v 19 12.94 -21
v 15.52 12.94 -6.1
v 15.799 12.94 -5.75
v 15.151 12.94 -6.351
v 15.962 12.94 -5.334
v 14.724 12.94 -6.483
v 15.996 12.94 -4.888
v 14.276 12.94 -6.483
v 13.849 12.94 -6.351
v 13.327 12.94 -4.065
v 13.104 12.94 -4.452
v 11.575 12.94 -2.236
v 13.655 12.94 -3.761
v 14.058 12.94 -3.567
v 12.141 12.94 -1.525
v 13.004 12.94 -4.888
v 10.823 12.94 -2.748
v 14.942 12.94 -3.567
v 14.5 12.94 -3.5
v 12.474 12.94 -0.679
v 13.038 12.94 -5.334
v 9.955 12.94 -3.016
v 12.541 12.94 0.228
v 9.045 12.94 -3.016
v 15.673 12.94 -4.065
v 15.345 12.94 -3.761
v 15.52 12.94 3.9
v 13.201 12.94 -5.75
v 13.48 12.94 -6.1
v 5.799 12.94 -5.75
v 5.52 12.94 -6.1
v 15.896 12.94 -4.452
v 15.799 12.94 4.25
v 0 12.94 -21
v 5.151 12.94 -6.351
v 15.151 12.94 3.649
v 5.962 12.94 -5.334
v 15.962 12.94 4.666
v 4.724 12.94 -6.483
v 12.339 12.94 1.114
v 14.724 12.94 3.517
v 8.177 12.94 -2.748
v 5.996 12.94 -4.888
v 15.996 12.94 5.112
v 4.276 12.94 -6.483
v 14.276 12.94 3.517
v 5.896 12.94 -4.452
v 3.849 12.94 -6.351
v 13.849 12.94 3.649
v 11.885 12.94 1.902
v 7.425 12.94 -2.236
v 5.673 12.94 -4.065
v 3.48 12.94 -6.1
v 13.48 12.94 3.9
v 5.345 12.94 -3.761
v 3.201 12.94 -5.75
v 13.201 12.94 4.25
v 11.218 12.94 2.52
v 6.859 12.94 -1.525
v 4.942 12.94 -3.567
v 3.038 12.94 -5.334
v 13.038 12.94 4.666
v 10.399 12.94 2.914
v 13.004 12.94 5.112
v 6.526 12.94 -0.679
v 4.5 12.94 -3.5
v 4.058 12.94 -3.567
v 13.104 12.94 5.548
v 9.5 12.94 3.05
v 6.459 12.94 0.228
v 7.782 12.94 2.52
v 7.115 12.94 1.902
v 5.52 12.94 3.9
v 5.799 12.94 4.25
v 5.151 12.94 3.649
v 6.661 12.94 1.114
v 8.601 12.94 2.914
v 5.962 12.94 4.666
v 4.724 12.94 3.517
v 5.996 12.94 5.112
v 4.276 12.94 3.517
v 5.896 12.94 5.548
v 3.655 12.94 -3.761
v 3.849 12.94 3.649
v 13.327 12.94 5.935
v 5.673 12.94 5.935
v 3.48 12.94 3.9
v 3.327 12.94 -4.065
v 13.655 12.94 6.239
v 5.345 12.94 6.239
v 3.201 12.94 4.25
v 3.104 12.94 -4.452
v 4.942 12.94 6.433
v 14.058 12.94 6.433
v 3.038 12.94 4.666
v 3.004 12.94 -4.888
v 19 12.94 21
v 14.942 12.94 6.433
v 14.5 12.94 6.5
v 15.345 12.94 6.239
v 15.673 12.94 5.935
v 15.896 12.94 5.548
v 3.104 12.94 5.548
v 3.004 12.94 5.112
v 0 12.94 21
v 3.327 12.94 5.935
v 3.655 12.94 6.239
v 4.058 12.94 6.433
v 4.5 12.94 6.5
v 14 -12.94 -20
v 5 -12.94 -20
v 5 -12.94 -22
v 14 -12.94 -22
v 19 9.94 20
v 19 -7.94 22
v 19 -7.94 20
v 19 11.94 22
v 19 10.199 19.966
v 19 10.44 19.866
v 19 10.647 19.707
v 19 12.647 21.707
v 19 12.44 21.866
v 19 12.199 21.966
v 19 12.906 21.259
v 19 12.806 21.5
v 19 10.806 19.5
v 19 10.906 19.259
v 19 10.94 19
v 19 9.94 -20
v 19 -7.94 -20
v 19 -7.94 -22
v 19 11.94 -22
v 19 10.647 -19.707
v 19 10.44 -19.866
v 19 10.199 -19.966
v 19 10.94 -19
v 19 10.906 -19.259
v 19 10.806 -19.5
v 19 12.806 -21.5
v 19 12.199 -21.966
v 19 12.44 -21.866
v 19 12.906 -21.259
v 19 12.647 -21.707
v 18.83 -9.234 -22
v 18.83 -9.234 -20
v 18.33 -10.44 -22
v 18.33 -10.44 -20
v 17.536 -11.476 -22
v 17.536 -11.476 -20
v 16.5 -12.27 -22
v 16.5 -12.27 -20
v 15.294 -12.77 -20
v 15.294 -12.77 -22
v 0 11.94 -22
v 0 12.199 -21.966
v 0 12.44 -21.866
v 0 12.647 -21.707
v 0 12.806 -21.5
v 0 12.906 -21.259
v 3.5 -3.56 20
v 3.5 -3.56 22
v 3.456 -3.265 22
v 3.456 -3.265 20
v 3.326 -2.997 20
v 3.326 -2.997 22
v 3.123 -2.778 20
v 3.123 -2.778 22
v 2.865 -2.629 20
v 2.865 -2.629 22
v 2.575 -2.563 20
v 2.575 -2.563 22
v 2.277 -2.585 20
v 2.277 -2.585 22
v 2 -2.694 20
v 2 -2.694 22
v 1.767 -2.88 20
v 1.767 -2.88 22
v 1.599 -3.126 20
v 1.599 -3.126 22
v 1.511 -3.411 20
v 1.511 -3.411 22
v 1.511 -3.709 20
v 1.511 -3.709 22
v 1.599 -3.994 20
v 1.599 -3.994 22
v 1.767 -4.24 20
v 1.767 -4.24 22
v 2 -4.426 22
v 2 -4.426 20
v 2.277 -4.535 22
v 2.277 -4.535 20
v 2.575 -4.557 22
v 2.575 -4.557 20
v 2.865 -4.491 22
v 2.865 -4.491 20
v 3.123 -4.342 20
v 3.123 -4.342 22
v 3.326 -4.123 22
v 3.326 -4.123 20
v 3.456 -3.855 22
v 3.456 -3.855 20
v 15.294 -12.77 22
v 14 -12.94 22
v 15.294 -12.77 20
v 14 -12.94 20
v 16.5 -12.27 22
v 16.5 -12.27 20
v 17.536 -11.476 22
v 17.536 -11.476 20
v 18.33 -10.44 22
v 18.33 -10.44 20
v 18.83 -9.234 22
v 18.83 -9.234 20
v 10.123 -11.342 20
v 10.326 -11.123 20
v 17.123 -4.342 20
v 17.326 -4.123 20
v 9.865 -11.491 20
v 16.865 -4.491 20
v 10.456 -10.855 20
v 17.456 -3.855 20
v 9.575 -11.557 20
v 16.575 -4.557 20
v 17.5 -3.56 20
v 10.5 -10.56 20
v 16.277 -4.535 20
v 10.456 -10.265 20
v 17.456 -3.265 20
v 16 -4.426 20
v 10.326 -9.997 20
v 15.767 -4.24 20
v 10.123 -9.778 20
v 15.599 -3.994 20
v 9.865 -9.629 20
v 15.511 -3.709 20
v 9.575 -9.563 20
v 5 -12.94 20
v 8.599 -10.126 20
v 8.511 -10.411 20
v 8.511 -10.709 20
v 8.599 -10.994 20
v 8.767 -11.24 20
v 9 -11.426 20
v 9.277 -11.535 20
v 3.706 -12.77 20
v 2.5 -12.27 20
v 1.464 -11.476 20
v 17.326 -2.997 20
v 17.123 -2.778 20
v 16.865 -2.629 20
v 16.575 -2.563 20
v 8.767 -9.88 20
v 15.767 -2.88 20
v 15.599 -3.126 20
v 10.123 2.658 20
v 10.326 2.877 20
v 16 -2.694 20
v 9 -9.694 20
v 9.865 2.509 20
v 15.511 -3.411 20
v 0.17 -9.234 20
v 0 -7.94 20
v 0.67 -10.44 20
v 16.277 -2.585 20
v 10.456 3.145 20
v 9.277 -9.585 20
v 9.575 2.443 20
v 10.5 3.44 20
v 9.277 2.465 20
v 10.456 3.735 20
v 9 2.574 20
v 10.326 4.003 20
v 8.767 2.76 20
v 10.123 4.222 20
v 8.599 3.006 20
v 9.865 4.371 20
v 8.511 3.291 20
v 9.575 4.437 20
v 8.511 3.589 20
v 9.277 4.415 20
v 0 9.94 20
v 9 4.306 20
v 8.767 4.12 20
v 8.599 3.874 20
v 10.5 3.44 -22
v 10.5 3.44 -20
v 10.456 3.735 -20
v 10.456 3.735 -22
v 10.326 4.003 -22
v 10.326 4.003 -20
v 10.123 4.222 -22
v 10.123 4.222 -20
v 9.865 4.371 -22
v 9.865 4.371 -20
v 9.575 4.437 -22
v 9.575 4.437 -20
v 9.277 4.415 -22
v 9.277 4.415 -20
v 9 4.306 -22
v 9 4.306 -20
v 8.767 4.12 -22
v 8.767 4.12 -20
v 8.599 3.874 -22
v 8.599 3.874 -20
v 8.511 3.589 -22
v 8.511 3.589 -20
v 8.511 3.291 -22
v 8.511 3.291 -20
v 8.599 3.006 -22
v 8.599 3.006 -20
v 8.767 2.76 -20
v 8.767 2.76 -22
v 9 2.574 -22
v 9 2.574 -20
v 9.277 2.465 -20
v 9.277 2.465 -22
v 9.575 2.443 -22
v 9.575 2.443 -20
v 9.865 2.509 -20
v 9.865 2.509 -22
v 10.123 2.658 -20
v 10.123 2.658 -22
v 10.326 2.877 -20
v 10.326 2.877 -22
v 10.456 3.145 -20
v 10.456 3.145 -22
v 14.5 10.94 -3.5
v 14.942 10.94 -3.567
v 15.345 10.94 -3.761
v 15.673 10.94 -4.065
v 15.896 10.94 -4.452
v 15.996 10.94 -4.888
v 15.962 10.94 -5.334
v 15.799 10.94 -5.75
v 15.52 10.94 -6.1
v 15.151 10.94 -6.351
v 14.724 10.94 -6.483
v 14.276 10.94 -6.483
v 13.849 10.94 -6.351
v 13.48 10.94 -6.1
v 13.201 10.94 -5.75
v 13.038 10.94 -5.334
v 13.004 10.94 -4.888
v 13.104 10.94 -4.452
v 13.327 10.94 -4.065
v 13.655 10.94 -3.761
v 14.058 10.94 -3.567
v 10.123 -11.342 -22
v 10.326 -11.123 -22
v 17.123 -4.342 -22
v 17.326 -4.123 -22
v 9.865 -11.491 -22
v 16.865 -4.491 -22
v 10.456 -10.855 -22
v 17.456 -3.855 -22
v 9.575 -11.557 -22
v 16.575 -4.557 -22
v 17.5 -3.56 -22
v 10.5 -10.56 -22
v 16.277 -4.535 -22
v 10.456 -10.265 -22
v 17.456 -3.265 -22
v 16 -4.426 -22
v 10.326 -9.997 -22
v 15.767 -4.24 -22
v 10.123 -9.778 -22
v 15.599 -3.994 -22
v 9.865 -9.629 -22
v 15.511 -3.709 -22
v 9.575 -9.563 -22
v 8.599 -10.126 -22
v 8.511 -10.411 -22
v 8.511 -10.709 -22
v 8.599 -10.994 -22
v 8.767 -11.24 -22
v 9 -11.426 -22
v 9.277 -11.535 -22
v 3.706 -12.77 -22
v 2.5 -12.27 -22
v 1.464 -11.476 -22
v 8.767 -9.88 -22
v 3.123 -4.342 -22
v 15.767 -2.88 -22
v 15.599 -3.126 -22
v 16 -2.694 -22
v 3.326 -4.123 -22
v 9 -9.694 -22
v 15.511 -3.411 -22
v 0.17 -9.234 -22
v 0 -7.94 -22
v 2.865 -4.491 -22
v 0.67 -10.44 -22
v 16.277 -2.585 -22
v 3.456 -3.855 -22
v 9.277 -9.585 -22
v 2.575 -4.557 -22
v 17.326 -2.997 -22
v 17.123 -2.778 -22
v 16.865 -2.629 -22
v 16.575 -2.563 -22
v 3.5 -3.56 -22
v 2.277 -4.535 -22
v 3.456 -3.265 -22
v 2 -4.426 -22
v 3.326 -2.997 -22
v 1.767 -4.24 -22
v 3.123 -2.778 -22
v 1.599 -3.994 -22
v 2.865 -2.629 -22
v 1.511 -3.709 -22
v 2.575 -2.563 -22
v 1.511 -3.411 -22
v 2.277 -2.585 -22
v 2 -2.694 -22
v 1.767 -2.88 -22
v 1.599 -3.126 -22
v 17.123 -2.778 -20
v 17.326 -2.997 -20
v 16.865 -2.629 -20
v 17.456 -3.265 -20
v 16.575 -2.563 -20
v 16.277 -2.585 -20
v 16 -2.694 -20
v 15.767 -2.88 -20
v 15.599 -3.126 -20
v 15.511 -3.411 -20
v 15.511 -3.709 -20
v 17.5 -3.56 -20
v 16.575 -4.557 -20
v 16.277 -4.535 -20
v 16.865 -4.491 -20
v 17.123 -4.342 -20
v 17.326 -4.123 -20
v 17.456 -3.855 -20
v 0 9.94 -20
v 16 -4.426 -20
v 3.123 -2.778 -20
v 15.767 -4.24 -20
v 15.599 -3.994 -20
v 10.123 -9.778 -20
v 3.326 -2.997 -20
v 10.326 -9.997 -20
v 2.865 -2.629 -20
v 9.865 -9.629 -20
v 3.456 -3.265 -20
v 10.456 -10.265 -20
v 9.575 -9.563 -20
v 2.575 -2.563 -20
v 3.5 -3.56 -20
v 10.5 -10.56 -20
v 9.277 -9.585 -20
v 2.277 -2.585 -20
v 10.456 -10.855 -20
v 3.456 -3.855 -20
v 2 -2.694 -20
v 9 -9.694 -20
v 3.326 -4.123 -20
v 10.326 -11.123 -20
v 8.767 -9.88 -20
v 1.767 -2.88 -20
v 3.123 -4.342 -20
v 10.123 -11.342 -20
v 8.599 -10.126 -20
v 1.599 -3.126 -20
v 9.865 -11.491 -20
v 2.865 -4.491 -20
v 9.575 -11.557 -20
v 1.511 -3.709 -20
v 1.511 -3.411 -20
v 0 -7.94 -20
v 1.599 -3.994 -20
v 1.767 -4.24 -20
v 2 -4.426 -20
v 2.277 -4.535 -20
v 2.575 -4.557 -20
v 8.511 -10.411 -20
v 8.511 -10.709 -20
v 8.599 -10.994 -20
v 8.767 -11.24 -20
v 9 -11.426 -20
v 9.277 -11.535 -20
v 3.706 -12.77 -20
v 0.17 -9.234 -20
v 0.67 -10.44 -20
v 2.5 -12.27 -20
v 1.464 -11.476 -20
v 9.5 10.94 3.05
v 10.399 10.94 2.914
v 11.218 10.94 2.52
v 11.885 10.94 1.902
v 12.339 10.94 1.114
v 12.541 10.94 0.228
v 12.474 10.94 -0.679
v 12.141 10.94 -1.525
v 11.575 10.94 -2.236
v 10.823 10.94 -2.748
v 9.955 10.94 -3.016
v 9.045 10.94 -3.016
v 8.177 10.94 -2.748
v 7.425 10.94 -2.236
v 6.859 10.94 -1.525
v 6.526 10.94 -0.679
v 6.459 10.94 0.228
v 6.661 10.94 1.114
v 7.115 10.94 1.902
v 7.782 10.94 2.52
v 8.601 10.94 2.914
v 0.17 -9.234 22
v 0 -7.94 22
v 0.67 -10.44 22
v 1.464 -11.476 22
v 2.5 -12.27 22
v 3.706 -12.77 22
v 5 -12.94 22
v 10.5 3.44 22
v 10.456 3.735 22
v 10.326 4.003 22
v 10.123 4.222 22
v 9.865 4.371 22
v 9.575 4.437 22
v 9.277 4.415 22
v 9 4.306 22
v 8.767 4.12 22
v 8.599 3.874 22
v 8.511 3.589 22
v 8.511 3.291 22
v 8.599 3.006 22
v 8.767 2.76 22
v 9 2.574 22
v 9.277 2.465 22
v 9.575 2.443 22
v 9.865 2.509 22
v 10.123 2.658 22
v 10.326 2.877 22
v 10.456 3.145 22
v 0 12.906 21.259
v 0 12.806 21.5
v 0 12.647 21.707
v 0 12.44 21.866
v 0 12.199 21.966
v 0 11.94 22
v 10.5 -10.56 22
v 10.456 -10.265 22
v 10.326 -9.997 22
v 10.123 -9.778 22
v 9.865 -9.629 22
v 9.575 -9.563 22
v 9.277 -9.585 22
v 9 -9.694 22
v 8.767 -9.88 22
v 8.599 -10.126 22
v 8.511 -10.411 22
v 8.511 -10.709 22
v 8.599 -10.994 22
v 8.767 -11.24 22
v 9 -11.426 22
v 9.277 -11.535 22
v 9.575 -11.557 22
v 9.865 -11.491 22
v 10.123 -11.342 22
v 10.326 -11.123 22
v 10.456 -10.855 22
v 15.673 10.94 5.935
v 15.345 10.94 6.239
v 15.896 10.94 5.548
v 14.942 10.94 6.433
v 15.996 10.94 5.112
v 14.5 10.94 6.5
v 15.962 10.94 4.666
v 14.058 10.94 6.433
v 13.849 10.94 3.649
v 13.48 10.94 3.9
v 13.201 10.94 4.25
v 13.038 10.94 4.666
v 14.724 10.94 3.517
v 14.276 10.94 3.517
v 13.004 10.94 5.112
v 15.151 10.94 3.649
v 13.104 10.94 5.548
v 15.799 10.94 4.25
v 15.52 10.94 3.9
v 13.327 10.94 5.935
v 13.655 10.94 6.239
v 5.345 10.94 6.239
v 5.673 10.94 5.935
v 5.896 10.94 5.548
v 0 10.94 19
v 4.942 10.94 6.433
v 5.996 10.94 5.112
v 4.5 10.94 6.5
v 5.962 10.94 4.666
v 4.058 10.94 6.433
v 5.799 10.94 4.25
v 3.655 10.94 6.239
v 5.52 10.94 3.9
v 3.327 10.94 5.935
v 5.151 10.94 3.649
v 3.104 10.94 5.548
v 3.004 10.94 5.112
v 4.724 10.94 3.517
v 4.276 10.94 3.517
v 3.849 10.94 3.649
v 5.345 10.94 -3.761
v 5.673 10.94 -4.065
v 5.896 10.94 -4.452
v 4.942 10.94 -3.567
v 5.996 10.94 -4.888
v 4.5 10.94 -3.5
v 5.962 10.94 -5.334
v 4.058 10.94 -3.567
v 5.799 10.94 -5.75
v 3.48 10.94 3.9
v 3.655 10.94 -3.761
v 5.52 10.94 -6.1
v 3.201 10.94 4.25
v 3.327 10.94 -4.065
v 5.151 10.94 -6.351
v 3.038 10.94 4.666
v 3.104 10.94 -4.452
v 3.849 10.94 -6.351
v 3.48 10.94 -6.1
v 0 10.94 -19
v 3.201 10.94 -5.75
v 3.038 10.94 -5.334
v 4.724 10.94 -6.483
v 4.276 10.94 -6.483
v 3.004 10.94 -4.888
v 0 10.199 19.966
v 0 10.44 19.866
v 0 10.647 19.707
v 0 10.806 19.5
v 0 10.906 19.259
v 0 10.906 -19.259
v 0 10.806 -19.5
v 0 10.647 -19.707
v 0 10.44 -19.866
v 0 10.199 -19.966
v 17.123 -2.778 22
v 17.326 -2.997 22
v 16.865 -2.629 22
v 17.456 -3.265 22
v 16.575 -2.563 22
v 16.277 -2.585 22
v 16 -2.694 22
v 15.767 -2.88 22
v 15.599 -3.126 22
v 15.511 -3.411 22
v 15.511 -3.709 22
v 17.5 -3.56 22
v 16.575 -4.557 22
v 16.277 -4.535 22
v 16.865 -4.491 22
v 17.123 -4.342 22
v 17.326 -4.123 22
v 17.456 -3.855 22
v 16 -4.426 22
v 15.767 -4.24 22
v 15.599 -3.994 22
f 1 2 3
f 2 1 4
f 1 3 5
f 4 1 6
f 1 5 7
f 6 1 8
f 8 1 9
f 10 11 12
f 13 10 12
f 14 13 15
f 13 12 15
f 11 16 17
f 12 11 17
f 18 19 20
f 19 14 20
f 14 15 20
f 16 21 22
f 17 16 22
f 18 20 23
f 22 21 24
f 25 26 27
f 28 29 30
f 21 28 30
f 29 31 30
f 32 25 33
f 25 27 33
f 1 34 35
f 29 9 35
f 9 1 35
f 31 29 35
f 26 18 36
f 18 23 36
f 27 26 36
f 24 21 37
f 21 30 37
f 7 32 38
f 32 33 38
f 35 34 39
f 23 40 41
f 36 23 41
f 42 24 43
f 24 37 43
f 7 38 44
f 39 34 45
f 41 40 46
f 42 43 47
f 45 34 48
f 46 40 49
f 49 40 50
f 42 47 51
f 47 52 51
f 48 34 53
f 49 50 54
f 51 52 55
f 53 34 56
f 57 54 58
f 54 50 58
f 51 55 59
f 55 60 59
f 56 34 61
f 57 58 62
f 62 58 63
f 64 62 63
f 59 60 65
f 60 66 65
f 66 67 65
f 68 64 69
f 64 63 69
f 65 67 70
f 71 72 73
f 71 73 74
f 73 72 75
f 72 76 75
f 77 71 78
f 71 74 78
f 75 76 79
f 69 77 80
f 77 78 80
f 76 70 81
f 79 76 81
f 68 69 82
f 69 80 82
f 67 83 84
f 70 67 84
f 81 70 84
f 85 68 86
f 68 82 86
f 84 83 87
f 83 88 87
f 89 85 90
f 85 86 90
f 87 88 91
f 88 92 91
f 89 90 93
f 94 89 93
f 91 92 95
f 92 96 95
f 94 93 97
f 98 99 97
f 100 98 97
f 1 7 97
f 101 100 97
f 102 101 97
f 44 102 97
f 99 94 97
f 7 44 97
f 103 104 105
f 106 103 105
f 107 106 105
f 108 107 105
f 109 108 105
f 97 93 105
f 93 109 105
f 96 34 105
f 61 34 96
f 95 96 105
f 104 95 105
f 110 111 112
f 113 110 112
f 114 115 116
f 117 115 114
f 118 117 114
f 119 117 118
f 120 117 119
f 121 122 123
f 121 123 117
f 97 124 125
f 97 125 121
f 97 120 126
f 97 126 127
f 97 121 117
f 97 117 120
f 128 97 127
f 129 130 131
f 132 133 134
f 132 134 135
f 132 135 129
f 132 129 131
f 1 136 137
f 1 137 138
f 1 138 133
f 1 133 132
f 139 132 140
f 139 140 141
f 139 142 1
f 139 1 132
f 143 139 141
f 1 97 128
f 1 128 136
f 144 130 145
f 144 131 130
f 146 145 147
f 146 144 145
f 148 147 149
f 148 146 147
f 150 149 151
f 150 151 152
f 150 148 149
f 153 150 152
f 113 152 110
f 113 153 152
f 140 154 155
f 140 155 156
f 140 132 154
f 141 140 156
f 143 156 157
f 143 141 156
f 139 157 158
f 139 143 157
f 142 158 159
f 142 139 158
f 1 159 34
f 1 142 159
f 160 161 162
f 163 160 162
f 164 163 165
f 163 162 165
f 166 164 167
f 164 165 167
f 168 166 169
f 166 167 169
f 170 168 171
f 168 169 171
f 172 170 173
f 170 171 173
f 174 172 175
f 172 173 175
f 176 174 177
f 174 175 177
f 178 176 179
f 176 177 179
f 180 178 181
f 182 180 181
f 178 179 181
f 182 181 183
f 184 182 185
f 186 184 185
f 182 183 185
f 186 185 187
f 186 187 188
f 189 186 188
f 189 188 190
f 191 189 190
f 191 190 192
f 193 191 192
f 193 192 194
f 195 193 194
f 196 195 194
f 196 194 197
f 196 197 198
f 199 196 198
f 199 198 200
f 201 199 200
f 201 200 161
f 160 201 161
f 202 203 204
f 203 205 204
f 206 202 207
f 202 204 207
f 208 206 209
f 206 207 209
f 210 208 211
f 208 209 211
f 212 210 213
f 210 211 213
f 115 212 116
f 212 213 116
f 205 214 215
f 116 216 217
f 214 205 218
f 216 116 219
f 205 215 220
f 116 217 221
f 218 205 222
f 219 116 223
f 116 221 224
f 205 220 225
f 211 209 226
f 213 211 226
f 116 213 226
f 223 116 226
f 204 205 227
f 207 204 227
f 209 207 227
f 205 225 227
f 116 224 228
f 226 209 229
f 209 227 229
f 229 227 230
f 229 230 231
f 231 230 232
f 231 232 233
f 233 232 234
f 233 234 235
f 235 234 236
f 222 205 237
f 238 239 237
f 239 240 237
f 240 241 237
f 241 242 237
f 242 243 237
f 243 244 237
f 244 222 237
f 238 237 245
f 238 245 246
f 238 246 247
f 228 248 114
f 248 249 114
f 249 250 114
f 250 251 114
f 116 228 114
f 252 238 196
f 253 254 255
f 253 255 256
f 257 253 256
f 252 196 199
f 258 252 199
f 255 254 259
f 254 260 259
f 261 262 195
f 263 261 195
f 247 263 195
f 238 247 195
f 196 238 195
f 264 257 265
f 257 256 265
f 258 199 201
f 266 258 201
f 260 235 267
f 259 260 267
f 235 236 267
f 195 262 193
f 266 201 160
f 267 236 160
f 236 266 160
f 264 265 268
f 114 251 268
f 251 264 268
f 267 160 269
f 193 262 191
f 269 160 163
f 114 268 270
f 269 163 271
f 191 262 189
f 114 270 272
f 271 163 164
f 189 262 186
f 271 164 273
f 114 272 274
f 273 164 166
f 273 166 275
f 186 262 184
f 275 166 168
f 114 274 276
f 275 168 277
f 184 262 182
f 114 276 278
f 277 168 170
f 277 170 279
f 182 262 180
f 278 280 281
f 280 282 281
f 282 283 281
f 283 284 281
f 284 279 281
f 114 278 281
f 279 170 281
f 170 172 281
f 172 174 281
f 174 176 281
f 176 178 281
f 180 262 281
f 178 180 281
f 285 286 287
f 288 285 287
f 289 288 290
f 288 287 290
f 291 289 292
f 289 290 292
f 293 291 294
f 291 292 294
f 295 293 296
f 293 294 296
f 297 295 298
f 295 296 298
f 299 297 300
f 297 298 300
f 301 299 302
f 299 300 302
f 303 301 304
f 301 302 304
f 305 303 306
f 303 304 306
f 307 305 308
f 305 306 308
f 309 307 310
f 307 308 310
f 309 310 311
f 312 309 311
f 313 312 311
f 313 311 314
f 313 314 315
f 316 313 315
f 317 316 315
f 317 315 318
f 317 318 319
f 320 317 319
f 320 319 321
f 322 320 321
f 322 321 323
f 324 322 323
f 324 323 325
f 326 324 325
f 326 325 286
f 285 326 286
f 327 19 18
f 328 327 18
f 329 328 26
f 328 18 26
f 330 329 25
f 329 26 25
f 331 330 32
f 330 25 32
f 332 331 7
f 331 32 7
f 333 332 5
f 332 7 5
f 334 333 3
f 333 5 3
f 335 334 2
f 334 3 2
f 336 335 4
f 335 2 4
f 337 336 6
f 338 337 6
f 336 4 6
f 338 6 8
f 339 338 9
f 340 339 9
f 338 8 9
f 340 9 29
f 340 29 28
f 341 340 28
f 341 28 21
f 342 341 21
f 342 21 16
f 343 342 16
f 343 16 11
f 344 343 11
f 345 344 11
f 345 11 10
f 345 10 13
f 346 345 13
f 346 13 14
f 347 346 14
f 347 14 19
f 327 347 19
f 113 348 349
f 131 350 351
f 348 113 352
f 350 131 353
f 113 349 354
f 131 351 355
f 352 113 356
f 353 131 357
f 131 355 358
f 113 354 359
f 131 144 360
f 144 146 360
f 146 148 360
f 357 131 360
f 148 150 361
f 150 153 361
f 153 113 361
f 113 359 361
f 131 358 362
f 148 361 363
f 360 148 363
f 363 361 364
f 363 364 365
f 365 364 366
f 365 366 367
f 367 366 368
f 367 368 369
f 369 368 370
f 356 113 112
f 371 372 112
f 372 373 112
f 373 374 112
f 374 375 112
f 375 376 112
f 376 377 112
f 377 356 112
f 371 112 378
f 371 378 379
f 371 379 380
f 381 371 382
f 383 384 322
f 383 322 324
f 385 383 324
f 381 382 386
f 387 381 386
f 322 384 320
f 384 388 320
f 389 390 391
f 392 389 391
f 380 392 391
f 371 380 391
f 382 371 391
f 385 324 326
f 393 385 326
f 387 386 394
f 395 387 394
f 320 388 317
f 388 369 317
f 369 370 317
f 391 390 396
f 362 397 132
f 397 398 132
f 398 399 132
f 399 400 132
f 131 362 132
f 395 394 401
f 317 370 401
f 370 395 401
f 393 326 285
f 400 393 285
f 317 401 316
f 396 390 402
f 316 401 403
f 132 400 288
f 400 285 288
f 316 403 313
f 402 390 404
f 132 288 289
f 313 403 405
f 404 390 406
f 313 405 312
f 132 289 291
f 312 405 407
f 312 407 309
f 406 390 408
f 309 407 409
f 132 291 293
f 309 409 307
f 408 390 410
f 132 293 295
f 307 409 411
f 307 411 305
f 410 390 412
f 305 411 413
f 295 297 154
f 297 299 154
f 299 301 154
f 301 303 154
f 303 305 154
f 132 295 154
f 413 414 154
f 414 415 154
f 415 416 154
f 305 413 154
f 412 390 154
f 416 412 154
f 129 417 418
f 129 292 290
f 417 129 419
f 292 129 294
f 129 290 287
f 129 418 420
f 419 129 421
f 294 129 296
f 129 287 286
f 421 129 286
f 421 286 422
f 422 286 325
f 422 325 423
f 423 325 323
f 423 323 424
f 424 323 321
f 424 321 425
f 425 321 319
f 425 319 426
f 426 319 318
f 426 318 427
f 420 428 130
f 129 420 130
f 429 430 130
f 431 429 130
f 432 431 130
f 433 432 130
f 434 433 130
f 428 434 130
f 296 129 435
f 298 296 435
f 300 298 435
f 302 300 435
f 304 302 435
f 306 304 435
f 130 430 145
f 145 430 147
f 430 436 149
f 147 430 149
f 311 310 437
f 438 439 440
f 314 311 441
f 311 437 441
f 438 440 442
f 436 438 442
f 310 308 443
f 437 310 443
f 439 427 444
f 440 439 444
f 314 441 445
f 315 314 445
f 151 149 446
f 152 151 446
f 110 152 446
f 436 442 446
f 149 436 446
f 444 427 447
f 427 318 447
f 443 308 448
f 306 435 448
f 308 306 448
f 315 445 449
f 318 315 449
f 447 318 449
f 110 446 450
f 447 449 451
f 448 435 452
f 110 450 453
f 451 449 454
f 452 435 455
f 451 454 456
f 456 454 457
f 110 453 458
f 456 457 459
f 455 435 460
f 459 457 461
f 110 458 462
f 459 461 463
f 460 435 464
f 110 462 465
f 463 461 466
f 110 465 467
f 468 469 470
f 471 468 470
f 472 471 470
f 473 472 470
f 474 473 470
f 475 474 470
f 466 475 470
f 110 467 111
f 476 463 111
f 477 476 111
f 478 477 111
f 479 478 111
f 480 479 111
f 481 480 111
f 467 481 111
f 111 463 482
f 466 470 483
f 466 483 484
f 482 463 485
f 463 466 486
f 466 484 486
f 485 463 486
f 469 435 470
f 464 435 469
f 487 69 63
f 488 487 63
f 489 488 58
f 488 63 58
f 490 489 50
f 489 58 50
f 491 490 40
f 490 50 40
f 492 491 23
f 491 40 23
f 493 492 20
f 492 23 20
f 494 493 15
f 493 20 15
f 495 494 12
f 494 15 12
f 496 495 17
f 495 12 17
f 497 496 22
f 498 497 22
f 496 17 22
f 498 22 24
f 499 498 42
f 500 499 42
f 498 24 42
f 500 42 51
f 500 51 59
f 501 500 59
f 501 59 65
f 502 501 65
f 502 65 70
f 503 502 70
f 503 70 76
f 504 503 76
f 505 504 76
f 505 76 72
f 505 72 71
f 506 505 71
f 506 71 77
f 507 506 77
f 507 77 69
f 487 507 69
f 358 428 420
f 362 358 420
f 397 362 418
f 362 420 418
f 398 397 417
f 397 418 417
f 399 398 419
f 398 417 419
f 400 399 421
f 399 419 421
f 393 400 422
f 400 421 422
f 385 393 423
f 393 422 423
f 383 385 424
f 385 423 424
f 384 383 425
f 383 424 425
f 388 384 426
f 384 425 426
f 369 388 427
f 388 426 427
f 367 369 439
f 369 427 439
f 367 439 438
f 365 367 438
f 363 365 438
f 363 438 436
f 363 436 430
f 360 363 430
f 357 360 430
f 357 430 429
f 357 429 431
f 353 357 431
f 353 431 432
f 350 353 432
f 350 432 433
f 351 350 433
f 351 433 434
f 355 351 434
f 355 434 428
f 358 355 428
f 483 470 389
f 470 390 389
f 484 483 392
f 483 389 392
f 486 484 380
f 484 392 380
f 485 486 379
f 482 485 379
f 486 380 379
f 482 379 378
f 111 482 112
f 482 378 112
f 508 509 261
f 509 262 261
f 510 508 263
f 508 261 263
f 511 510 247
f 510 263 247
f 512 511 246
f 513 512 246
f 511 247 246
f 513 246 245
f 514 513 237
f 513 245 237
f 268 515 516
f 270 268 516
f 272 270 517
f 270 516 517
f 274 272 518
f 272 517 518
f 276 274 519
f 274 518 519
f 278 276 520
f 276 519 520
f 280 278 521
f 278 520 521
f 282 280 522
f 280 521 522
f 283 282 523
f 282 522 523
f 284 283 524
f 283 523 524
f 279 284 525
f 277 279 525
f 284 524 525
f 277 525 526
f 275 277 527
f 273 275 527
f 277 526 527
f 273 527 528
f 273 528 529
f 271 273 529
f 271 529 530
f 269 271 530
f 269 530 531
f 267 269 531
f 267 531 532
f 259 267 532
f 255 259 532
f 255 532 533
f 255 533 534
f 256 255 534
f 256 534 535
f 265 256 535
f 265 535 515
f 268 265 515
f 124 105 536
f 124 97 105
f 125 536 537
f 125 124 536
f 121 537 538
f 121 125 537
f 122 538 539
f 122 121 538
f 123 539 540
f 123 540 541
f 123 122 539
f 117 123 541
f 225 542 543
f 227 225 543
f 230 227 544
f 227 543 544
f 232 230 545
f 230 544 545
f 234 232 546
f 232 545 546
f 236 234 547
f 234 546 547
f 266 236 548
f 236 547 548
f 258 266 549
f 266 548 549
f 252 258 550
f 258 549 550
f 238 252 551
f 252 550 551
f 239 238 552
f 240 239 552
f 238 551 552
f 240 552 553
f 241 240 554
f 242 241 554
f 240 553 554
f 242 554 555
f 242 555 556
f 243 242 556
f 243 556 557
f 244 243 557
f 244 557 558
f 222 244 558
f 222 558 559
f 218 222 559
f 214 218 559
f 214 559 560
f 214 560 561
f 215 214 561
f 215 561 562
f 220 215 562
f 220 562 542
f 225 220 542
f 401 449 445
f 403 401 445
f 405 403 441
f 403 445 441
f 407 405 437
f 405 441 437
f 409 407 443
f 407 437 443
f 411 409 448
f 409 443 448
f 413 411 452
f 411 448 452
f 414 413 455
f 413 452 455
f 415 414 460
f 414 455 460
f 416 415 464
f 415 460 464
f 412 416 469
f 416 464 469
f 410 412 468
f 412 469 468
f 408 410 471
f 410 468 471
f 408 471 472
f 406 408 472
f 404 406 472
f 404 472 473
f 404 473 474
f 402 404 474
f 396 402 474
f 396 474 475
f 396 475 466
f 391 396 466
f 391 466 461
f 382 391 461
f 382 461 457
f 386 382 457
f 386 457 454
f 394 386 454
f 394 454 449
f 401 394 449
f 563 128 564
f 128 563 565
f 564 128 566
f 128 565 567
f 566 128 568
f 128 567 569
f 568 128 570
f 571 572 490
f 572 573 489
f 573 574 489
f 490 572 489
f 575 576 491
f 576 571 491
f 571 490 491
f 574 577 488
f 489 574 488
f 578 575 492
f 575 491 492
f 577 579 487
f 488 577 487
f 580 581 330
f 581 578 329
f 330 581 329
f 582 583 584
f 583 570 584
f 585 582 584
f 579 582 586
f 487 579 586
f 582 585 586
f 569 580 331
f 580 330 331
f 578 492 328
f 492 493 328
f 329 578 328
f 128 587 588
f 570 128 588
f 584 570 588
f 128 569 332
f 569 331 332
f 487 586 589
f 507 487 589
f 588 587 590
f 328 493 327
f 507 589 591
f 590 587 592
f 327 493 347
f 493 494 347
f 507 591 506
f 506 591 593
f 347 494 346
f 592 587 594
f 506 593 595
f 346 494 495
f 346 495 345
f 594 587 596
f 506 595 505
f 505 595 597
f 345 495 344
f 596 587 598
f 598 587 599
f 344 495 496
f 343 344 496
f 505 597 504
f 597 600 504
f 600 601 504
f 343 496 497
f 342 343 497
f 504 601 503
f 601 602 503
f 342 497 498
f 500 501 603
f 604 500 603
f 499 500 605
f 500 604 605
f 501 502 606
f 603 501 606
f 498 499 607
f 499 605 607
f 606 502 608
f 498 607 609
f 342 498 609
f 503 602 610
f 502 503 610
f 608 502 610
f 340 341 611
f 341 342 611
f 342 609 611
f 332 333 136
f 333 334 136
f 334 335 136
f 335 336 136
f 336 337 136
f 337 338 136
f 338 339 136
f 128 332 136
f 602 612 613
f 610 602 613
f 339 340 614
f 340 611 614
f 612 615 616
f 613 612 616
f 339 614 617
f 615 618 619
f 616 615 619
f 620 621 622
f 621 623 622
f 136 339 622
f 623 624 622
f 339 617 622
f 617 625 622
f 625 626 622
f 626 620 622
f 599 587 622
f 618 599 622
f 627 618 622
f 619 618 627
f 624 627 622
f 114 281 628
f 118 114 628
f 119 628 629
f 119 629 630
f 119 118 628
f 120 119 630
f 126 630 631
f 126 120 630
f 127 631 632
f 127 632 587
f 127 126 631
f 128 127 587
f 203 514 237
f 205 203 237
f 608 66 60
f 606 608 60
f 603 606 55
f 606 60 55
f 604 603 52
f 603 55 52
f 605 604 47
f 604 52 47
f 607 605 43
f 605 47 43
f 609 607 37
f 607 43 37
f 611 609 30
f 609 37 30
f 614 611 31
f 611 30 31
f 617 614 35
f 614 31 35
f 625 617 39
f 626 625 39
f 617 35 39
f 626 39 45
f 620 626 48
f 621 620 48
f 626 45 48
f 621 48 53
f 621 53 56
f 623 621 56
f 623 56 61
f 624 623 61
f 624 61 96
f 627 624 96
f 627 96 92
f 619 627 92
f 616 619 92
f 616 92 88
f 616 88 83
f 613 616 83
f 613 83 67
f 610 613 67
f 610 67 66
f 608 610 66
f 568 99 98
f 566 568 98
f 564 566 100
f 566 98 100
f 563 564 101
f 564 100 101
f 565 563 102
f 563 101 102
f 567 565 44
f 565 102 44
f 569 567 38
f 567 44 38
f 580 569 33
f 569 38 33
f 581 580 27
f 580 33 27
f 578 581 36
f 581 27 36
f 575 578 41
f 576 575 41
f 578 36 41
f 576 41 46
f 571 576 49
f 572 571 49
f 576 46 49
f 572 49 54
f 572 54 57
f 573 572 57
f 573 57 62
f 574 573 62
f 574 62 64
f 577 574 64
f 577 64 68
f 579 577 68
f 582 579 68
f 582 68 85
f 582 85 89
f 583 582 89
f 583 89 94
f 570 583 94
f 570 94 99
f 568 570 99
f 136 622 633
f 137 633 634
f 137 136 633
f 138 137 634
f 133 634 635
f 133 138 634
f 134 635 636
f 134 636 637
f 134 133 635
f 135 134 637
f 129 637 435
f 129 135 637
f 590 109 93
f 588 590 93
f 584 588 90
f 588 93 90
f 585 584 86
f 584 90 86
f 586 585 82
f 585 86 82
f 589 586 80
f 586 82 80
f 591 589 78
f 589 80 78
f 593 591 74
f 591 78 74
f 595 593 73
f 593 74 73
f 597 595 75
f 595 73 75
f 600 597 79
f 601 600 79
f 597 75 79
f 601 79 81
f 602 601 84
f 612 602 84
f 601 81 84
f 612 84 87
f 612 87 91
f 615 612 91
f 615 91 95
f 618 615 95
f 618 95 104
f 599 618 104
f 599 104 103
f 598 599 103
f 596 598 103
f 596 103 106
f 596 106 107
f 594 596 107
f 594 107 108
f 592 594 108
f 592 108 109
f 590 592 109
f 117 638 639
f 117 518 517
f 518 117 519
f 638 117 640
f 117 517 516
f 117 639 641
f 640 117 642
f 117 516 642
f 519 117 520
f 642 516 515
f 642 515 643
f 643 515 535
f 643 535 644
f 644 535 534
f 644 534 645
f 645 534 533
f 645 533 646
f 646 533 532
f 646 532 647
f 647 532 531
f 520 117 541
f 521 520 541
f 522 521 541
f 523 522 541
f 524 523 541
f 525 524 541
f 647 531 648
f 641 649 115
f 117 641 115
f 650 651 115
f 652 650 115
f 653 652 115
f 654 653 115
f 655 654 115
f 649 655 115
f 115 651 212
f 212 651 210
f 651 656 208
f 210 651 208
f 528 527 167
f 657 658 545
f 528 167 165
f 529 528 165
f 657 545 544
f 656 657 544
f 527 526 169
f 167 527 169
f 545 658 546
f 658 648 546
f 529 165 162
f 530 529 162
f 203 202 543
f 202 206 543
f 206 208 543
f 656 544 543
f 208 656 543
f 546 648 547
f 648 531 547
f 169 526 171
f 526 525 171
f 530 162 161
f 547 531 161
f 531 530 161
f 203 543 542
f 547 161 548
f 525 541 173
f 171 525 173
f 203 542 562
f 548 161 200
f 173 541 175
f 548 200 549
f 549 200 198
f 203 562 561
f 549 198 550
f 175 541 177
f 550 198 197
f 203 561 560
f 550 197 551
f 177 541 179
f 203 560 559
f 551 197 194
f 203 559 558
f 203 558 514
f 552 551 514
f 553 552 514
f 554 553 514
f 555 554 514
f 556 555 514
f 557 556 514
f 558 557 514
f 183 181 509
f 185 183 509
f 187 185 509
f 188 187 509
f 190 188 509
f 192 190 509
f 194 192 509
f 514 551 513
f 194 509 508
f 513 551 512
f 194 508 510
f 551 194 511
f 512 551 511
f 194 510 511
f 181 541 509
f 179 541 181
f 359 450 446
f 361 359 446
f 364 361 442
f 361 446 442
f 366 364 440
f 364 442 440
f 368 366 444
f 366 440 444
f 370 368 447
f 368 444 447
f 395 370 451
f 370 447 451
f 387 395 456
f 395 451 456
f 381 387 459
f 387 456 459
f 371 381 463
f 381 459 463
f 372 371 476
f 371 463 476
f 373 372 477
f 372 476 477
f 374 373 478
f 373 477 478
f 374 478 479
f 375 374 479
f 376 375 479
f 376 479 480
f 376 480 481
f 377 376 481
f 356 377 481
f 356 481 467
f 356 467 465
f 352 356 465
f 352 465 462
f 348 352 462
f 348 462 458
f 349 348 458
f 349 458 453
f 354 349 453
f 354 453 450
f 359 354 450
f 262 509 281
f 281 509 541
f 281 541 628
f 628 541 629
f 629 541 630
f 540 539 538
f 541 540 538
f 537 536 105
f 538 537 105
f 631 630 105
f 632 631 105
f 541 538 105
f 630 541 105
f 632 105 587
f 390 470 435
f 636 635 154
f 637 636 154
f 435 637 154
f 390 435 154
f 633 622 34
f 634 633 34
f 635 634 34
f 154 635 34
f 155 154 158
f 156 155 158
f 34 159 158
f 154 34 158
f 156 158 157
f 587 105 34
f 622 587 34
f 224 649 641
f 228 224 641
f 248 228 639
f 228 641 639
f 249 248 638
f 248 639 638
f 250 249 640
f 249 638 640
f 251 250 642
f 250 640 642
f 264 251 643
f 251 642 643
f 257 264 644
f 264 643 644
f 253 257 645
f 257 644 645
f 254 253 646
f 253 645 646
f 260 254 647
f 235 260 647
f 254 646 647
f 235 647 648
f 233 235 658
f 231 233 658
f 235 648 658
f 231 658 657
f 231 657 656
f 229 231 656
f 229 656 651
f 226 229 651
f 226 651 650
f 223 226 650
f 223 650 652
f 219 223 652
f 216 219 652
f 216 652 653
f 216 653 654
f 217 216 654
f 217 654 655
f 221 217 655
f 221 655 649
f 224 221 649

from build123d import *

# Parameters (mm, degrees)
EXTRUDE_1_DEPTH     = 19
FILLET_1_R          = 1
SKETCH_2_R          = 1
CUT_EXTRUDE_1_DEPTH = 500000
FILLET_2_R          = 5
FILLET_3_R          = 5
SKETCH_3_R          = 3.05
SKETCH_3_R_2        = 1.5
CUT_EXTRUDE_2_DEPTH = 500


with BuildPart() as part:
    # 草图1 → 凸台-拉伸1 (new body)
    with BuildSketch(Plane(origin=(0, 0, 0), x_dir=(0, 0, -1), z_dir=(1, 0, 0))):
        Polygon((-20, -12.94), (-20, 10.94), (20, 10.94), (20, -12.94), (22, -12.94), (22, 12.94), (-22, 12.94), (-22, -12.94), align=None)
    extrude(amount=EXTRUDE_1_DEPTH)

    # 圆角1
    fillet_1_edges = [part.edges().sort_by_distance(p)[0] for p in [
        (9.5, 10.94, -20),
        (9.5, 10.94, 20),
        (9.5, 12.94, 22),
        (9.5, 12.94, -22),
    ]]
    fillet(fillet_1_edges, radius=FILLET_1_R)

    # 草图2 → 切除-拉伸1 (cut)
    with BuildSketch(Plane.XY.offset(22)):
        with Locations((2.5, -3.56)):
            Circle(SKETCH_2_R)
        with Locations((16.5, -3.56)):
            Circle(SKETCH_2_R)
        with Locations((9.5, -10.56)):
            Circle(SKETCH_2_R)
        with Locations((9.5, 3.44)):
            Circle(SKETCH_2_R)
    extrude(amount=-CUT_EXTRUDE_1_DEPTH, mode=Mode.SUBTRACT)

    # 圆角2
    fillet_2_edges = [part.edges().sort_by_distance(p)[0] for p in [
        (19, -12.94, 21),
        (0, -12.94, 21),
    ]]
    fillet(fillet_2_edges, radius=FILLET_2_R)

    # 圆角3
    fillet_3_edges = [part.edges().sort_by_distance(p)[0] for p in [
        (0, -12.94, -21),
        (19, -12.94, -21),
    ]]
    fillet(fillet_3_edges, radius=FILLET_3_R)

    # 草图3 → 切除-拉伸2 (cut)
    with BuildSketch(Plane(origin=(0, 12.94, 0), x_dir=(1, 0, 0), z_dir=(0, 1, 0))):
        with Locations(Location((9.5, 0, 0), (0, 0, 270))):
            Circle(SKETCH_3_R)
        with Locations(Location((4.5, 5, 0), (0, 0, 270))):
            Circle(SKETCH_3_R_2)
        with Locations(Location((14.5, 5, 0), (0, 0, 270))):
            Circle(SKETCH_3_R_2)
        with Locations(Location((14.5, -5, 0), (0, 0, 270))):
            Circle(SKETCH_3_R_2)
        with Locations(Location((4.5, -5, 0), (0, 0, 270))):
            Circle(SKETCH_3_R_2)
    extrude(amount=-CUT_EXTRUDE_2_DEPTH, mode=Mode.SUBTRACT)


solid = part.part
